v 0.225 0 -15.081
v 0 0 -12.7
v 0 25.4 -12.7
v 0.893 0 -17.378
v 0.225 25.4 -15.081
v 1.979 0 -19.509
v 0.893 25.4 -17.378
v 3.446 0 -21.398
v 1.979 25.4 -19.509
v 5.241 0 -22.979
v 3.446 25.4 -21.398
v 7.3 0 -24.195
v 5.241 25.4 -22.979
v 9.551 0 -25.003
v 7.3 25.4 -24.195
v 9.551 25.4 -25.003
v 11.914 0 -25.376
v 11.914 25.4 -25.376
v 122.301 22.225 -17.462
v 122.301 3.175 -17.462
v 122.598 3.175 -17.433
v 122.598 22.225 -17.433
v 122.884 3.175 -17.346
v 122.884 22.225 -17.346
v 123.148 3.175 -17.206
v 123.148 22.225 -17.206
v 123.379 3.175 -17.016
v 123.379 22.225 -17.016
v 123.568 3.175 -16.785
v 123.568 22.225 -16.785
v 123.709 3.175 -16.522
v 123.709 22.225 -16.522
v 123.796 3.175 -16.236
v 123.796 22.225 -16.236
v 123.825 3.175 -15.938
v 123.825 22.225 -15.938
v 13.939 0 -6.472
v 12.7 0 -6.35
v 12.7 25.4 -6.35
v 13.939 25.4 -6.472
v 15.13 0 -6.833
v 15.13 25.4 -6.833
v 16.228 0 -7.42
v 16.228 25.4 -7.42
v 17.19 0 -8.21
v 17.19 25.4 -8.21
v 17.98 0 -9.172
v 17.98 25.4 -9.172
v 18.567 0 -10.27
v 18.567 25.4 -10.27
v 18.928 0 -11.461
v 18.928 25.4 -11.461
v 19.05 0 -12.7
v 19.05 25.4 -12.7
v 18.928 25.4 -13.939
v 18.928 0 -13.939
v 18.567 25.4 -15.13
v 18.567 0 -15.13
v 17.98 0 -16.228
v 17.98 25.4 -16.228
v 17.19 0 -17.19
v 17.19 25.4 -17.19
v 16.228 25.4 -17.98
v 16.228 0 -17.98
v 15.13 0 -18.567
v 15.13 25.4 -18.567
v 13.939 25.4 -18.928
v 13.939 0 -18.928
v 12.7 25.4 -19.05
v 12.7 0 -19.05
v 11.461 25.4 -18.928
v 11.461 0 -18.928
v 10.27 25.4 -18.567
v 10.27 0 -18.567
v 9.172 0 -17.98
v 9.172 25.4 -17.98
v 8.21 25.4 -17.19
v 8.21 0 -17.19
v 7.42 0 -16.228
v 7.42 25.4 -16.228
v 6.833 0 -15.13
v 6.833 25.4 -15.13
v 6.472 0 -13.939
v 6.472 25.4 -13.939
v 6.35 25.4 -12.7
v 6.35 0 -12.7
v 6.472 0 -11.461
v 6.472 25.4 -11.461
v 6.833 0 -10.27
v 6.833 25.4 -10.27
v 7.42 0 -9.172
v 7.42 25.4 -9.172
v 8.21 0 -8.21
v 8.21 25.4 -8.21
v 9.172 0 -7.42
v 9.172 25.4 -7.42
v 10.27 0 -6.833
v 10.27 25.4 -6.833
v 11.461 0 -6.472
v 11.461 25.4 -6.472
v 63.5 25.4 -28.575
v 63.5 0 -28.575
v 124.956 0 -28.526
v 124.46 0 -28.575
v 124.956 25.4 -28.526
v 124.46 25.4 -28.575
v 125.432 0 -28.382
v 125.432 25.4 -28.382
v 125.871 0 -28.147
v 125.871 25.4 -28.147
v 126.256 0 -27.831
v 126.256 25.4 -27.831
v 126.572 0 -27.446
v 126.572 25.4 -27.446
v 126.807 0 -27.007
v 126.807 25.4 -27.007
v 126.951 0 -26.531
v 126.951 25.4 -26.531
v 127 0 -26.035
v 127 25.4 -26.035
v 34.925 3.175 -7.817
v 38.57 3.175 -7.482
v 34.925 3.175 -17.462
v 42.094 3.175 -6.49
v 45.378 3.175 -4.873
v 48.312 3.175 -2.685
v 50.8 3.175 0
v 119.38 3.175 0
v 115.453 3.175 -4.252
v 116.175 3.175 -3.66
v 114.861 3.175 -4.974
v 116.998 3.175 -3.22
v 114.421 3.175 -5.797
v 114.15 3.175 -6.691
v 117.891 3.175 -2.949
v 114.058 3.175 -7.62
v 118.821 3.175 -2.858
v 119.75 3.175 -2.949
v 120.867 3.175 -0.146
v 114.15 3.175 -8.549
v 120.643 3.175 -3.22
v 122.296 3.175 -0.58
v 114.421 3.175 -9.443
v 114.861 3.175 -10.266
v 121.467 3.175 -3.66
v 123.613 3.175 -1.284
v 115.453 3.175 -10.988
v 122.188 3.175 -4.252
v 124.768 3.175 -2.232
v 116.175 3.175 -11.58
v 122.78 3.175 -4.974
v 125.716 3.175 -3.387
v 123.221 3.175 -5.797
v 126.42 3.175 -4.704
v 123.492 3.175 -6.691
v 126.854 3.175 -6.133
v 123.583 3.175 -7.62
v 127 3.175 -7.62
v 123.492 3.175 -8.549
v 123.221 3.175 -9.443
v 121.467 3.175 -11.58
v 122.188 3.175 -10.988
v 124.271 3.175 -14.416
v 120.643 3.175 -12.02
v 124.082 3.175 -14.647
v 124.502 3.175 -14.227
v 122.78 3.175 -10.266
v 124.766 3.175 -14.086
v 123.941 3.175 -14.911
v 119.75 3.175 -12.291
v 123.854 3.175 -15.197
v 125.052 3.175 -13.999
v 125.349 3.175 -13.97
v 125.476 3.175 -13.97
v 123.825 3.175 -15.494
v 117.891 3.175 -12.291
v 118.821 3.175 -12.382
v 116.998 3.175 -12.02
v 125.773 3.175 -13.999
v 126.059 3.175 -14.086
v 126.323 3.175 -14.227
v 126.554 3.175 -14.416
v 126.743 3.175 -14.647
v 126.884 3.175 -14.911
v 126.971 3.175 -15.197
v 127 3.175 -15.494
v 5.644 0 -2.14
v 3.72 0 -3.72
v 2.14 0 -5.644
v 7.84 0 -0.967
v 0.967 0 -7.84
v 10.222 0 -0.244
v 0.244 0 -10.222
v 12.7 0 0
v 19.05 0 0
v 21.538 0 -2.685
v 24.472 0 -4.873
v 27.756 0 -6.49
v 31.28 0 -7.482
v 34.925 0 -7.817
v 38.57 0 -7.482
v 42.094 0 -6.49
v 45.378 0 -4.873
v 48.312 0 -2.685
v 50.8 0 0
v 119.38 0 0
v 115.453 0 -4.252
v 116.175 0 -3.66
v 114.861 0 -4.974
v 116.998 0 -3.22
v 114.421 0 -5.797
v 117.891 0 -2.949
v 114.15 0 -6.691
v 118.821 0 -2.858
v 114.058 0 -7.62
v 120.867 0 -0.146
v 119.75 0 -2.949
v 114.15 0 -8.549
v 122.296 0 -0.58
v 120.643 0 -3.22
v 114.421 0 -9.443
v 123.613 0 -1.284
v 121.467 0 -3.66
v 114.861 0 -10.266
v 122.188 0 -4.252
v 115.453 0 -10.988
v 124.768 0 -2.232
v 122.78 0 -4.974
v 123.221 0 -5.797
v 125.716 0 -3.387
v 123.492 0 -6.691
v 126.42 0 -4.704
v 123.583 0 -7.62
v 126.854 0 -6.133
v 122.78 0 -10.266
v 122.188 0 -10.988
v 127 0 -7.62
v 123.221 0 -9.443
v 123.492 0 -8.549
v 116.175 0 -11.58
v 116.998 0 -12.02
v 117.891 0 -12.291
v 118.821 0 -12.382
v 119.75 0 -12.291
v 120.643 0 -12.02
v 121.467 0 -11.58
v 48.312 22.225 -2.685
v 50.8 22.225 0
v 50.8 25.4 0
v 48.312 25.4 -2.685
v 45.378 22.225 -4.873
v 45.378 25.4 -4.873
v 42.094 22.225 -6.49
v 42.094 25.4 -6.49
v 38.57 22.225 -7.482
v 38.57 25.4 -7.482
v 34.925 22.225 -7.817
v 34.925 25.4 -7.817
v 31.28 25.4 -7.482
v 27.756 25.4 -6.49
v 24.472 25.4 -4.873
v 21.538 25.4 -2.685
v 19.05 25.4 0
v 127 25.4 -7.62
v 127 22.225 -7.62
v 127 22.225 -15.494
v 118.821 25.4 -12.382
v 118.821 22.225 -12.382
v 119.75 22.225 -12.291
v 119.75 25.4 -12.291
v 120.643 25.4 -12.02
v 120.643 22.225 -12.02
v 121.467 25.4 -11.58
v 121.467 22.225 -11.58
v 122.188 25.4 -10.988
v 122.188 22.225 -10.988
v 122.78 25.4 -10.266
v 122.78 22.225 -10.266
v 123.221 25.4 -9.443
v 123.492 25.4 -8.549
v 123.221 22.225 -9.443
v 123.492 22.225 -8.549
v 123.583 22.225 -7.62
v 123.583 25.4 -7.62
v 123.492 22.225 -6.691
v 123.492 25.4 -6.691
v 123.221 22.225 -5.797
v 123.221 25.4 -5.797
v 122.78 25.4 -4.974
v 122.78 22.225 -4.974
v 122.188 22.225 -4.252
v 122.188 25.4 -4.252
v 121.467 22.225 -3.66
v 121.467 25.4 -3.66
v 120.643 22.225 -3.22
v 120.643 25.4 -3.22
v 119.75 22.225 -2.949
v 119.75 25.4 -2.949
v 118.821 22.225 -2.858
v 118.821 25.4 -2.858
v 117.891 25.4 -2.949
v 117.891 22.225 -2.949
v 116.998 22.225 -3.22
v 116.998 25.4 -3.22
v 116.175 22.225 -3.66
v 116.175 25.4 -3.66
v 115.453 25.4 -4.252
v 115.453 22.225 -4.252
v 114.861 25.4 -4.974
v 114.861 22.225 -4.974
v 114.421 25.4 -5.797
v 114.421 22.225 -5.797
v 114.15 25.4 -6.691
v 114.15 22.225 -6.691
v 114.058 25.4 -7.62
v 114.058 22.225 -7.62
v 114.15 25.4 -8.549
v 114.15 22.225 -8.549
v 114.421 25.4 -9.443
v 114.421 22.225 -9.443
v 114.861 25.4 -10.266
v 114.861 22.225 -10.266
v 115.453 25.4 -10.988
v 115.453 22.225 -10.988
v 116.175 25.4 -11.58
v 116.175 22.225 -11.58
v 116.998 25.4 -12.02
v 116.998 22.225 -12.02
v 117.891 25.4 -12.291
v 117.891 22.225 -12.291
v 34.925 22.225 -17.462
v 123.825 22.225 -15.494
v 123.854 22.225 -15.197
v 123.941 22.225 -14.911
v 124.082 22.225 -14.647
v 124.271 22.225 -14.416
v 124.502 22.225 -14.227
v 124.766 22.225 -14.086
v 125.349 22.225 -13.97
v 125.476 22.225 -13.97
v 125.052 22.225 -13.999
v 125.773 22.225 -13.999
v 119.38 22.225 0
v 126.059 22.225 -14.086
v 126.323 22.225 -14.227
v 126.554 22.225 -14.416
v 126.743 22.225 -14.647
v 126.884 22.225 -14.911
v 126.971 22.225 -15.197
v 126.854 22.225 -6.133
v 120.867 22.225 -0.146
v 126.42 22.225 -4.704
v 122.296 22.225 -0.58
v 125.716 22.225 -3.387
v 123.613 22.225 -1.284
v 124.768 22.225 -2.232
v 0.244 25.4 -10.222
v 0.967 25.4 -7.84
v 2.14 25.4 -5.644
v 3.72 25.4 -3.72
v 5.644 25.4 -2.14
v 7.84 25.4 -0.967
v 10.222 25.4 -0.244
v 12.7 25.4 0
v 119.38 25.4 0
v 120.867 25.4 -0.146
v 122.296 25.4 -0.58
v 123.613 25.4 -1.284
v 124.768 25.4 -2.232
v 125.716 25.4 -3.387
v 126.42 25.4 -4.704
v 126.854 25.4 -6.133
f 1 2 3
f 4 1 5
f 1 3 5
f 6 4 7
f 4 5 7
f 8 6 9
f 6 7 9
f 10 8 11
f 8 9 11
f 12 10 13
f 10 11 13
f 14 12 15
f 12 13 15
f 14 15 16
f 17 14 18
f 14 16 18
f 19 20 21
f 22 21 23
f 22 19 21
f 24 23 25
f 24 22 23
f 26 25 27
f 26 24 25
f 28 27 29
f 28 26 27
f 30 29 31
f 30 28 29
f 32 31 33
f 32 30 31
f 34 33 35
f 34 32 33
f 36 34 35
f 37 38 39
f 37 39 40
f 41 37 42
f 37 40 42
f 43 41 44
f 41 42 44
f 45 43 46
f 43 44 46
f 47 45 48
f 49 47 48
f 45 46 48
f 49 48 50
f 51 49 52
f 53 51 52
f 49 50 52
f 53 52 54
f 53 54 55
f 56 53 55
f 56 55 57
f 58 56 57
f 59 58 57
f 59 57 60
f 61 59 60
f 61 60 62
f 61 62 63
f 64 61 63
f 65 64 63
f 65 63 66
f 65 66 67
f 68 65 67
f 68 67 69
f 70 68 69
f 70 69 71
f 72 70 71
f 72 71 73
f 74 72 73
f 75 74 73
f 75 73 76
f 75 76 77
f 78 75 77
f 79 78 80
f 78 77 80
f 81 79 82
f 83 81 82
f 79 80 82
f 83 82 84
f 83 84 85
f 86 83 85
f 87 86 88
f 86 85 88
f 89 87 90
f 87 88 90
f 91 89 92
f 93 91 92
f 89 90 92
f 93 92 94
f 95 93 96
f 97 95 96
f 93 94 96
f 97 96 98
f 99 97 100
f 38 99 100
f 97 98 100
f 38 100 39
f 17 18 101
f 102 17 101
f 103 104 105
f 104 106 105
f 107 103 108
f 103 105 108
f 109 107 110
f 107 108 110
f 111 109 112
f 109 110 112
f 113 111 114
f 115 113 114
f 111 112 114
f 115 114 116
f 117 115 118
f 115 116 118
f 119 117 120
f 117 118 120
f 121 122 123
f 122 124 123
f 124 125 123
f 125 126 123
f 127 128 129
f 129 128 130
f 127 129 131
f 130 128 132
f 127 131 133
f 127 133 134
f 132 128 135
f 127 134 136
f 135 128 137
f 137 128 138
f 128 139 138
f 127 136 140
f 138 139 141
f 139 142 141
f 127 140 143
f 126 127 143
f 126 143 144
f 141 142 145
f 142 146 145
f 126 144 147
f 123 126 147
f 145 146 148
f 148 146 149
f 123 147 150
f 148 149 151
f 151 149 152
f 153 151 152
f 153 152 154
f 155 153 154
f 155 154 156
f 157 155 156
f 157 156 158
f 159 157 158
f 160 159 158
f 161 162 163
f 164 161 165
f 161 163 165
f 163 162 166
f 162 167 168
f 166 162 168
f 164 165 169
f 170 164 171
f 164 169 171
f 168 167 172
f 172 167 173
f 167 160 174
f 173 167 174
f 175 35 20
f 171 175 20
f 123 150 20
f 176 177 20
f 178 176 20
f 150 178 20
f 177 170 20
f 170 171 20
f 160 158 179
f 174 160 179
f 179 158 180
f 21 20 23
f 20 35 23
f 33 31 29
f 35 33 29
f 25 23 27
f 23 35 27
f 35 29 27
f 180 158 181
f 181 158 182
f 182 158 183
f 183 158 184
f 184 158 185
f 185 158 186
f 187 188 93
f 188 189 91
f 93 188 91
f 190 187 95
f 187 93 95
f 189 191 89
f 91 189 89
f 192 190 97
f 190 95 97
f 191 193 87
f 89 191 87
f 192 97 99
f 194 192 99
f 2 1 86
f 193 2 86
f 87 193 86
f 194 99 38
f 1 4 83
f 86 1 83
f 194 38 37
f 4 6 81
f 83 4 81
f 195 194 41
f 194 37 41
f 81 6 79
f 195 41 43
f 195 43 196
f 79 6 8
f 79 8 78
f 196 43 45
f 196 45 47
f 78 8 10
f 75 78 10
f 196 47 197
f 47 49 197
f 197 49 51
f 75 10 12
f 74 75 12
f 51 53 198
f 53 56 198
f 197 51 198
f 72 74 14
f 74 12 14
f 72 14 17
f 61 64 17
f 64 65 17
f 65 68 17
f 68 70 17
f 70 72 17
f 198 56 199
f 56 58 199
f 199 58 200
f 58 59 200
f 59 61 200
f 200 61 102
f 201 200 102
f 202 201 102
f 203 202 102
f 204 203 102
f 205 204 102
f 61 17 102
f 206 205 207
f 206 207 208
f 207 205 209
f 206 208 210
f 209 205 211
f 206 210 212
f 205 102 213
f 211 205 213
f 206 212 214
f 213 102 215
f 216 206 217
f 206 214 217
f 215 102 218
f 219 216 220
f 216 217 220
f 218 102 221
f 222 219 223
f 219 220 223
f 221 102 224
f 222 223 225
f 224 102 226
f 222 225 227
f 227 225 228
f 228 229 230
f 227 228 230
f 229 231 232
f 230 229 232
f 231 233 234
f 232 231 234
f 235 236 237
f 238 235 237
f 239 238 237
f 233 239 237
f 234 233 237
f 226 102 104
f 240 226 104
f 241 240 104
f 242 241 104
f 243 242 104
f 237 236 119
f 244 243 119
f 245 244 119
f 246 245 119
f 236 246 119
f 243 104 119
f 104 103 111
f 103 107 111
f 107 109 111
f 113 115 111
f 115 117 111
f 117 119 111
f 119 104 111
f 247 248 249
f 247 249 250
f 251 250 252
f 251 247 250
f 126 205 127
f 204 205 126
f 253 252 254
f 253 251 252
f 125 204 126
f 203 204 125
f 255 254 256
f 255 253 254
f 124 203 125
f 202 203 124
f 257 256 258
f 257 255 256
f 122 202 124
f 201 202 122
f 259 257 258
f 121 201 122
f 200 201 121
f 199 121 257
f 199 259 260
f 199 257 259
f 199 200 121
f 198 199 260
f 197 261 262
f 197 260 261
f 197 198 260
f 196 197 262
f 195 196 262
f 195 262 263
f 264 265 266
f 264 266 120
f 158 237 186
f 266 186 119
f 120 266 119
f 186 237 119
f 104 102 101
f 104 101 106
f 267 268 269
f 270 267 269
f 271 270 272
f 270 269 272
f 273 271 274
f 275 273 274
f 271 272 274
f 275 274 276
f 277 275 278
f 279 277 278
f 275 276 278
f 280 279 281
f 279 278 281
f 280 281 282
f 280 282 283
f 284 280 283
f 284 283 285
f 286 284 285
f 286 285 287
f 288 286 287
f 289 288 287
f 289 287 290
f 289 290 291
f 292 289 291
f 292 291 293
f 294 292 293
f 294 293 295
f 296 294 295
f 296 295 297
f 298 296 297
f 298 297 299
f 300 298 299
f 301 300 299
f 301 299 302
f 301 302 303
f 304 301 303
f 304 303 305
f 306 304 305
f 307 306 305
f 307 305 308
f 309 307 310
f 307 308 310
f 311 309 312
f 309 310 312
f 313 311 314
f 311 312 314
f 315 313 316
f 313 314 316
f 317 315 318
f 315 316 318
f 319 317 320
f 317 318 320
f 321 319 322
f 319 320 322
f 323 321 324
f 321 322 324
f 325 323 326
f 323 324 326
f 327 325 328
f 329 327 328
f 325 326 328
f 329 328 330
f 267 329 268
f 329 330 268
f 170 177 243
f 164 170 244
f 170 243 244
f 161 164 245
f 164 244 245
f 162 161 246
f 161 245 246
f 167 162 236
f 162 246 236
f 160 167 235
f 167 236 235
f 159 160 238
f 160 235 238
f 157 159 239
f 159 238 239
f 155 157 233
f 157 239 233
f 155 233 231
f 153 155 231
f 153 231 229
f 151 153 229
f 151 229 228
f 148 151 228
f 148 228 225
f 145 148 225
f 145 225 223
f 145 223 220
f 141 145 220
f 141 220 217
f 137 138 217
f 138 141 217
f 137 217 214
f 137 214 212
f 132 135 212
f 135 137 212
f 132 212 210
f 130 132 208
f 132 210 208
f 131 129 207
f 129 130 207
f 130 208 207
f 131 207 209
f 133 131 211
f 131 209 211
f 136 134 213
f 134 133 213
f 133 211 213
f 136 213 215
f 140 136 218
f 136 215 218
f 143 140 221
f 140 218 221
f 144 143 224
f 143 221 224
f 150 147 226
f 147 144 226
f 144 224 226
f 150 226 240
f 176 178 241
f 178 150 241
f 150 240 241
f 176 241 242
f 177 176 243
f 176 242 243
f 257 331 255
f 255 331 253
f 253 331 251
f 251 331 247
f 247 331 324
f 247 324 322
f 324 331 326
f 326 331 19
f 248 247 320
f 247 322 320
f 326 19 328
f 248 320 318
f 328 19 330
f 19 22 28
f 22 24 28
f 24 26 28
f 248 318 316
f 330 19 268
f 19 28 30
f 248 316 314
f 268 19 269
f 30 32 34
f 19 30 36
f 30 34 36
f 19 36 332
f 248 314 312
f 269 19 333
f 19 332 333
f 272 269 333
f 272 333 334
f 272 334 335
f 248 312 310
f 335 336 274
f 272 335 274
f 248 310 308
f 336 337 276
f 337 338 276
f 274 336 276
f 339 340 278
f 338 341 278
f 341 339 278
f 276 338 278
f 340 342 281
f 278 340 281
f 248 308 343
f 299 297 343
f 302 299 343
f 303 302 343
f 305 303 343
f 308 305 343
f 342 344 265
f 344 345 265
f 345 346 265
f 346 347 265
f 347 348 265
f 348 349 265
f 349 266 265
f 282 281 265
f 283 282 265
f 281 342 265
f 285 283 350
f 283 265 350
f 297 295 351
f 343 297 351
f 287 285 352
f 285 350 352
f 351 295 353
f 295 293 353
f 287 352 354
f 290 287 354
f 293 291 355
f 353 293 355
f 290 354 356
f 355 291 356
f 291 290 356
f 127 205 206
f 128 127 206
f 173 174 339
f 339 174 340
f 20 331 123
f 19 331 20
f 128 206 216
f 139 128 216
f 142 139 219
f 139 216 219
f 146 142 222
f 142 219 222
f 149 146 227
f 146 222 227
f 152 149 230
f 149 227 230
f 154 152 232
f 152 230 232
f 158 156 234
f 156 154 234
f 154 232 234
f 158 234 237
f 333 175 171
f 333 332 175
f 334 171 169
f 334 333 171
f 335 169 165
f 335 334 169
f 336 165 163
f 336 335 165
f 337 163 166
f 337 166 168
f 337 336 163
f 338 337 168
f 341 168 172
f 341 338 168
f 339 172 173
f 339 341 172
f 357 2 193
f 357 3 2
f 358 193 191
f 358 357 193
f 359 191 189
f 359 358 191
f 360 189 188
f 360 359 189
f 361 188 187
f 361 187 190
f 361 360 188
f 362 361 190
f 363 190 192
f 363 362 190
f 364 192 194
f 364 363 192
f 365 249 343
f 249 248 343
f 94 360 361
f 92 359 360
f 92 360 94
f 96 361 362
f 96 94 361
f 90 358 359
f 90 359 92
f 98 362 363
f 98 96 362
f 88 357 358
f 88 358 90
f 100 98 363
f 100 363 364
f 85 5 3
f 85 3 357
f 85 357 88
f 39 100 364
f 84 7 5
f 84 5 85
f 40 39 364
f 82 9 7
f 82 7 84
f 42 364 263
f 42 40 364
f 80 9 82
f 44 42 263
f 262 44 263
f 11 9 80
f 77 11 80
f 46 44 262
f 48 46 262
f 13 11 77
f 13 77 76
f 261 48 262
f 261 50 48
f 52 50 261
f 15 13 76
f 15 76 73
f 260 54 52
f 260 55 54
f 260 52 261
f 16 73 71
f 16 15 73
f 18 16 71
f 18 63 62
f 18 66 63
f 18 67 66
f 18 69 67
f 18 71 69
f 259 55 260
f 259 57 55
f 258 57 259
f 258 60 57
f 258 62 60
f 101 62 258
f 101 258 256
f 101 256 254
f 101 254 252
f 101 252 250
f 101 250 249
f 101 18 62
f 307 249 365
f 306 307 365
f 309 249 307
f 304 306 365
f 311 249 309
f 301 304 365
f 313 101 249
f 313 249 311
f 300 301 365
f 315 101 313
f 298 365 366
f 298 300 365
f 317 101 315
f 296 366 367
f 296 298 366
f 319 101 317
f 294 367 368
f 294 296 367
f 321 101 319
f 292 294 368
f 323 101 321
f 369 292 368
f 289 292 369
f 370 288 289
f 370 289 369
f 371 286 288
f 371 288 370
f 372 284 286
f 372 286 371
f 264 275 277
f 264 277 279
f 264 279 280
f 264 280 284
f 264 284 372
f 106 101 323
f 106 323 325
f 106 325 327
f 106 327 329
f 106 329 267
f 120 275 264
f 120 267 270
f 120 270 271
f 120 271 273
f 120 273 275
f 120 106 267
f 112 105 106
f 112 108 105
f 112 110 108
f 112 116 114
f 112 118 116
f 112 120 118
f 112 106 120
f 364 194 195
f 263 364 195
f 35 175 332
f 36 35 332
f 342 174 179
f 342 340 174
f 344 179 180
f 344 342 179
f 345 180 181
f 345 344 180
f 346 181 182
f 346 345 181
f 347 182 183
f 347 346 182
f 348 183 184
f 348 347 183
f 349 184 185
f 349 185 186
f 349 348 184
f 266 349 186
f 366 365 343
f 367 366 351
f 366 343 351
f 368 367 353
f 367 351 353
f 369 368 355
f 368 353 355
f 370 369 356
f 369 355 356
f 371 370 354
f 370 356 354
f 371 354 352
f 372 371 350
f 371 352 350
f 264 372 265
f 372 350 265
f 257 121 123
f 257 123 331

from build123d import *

# Parameters (mm, degrees)
SKETCH1_W               = 127
SKETCH1_H               = 28.575
BOSS_EXTRUDE1_DEPTH     = 25.4
CUT_EXTRUDE3_DEPTH      = 45.72
CUT_EXTRUDE3_DEPTH_BACK = 55.88
FILLET1_R               = 12.7
SKETCH6_R               = 6.35
CUT_EXTRUDE5_DEPTH      = 31.75
CUT_EXTRUDE6_DEPTH      = 31.75
SKETCH8_W               = 88.9
SKETCH8_H               = 19.05
CUT_EXTRUDE7_DEPTH      = 17.4625
FILLET2_R               = 7.62
SKETCH10_R              = 4.7625
CUT_EXTRUDE8_DEPTH      = 42.8625
SKETCH11_W              = 6.189214409
SKETCH11_H              = 19.05
SKETCH11_W_2            = 6.35
CUT_EXTRUDE10_DEPTH     = 8.0645
FILLET3_R               = 1.524
FILLET4_R               = 2.54


with BuildPart() as part:
    # Sketch1 → Boss-Extrude1 (new body)
    with BuildSketch(Plane(origin=(0, 0, 0), x_dir=(1, 0, 0), z_dir=(0, 1, 0))):
        with Locations((63.5, 14.2875)):
            Rectangle(SKETCH1_W, SKETCH1_H)
    extrude(amount=BOSS_EXTRUDE1_DEPTH)

    # Sketch5 → Cut-Extrude3 (cut, two sides: drawn at the far end of the back side and taken through both)
    with BuildSketch(Plane(origin=(0, 25.4, 0), x_dir=(1, 0, 0), z_dir=(0, 1, 0)).offset(-CUT_EXTRUDE3_DEPTH_BACK)):
        with BuildLine():
            Line((19.05, 0), (50.8, 0))
            ThreePointArc((50.8, 0), (34.925, 7.816775665), (19.05, 0))
        make_face()
    extrude(amount=CUT_EXTRUDE3_DEPTH + CUT_EXTRUDE3_DEPTH_BACK, mode=Mode.SUBTRACT)

    # Fillet1
    fillet1_edges = [part.edges().sort_by_distance(p)[0] for p in [
        (0, 12.7, -28.575),
        (0, 12.7, 0),
    ]]
    fillet(fillet1_edges, radius=FILLET1_R)

    # Sketch6 → Cut-Extrude5 (cut)
    with BuildSketch(Plane(origin=(0, 25.4, 0), x_dir=(1, 0, 0), z_dir=(0, 1, 0))):
        with Locations(Location((12.7, 12.7, 0), (0, 0, 270))):
            Circle(SKETCH6_R)
    extrude(amount=-CUT_EXTRUDE5_DEPTH, mode=Mode.SUBTRACT)

    # Sketch7 → Cut-Extrude6 (cut)
    with BuildSketch(Plane(origin=(0, 25.4, 0), x_dir=(1, 0, 0), z_dir=(0, 1, 0))):
        with BuildLine():
            Line((11.913860826, 25.375645356), (63.5, 28.575))
            Line((63.5, 28.575), (12.7, 28.575))
            ThreePointArc((12.7, 28.575), (3.719743879, 24.855256121), (0, 15.875))
            Line((0, 15.875), (0, 12.7))
            ThreePointArc((0, 12.7), (3.445974727, 21.397874237), (11.913860826, 25.375645356))
        make_face()
    extrude(amount=-CUT_EXTRUDE6_DEPTH, mode=Mode.SUBTRACT)

    # Sketch8 → Cut-Extrude7 (cut)
    with BuildSketch(Plane.XY):
        with Locations((79.375, 12.7)):
            Rectangle(SKETCH8_W, SKETCH8_H)
    extrude(amount=-CUT_EXTRUDE7_DEPTH, mode=Mode.SUBTRACT)

    # Fillet2
    # the kernel refuses this fillet: 7.62 mm, written as the material it takes off along each edge
    with BuildSketch(Plane(origin=(127, -19.05, 0), x_dir=(-1, 0, 0), z_dir=(0, 1, 0))) as fillet2_piece_1:
        with BuildLine():
            CenterArc((FILLET2_R, -FILLET2_R), FILLET2_R, 90, 90)
            Line((0, -FILLET2_R), (0, 0))
            Line((0, 0), (FILLET2_R, 0))
        make_face()
    extrude(amount=63.5, mode=Mode.SUBTRACT)

    # Sketch10 → Cut-Extrude8 (cut)
    with BuildSketch(Plane.XZ):
        with Locations(Location((118.820602805, -7.62, 0), (0, 0, 270))):
            Circle(SKETCH10_R)
    extrude(amount=-CUT_EXTRUDE8_DEPTH, mode=Mode.SUBTRACT)

    # Sketch11 → Cut-Extrude10 (cut)
    with BuildSketch(Plane(origin=(127, 0, 0), x_dir=(0, 0, -1), z_dir=(1, 0, 0))):
        with Locations((4.525392796, 12.7)):
            Rectangle(SKETCH11_W, SKETCH11_H)
        with Locations((10.795, 12.7)):
            Rectangle(SKETCH11_W_2, SKETCH11_H)
    extrude(amount=-CUT_EXTRUDE10_DEPTH, mode=Mode.SUBTRACT)

    # Fillet3
    fillet3_edges = [part.edges().sort_by_distance(p)[0] for p in [
        (123.825, 12.7, -13.97),
        (127, 12.7, -13.97),
        (123.825, 12.7, -17.4625),
    ]]
    fillet(fillet3_edges, radius=FILLET3_R)

    # Fillet4
    fillet4_edges = [part.edges().sort_by_distance(p)[0] for p in [
        (127, 12.7, -28.575),
    ]]
    fillet(fillet4_edges, radius=FILLET4_R)


solid = part.part
